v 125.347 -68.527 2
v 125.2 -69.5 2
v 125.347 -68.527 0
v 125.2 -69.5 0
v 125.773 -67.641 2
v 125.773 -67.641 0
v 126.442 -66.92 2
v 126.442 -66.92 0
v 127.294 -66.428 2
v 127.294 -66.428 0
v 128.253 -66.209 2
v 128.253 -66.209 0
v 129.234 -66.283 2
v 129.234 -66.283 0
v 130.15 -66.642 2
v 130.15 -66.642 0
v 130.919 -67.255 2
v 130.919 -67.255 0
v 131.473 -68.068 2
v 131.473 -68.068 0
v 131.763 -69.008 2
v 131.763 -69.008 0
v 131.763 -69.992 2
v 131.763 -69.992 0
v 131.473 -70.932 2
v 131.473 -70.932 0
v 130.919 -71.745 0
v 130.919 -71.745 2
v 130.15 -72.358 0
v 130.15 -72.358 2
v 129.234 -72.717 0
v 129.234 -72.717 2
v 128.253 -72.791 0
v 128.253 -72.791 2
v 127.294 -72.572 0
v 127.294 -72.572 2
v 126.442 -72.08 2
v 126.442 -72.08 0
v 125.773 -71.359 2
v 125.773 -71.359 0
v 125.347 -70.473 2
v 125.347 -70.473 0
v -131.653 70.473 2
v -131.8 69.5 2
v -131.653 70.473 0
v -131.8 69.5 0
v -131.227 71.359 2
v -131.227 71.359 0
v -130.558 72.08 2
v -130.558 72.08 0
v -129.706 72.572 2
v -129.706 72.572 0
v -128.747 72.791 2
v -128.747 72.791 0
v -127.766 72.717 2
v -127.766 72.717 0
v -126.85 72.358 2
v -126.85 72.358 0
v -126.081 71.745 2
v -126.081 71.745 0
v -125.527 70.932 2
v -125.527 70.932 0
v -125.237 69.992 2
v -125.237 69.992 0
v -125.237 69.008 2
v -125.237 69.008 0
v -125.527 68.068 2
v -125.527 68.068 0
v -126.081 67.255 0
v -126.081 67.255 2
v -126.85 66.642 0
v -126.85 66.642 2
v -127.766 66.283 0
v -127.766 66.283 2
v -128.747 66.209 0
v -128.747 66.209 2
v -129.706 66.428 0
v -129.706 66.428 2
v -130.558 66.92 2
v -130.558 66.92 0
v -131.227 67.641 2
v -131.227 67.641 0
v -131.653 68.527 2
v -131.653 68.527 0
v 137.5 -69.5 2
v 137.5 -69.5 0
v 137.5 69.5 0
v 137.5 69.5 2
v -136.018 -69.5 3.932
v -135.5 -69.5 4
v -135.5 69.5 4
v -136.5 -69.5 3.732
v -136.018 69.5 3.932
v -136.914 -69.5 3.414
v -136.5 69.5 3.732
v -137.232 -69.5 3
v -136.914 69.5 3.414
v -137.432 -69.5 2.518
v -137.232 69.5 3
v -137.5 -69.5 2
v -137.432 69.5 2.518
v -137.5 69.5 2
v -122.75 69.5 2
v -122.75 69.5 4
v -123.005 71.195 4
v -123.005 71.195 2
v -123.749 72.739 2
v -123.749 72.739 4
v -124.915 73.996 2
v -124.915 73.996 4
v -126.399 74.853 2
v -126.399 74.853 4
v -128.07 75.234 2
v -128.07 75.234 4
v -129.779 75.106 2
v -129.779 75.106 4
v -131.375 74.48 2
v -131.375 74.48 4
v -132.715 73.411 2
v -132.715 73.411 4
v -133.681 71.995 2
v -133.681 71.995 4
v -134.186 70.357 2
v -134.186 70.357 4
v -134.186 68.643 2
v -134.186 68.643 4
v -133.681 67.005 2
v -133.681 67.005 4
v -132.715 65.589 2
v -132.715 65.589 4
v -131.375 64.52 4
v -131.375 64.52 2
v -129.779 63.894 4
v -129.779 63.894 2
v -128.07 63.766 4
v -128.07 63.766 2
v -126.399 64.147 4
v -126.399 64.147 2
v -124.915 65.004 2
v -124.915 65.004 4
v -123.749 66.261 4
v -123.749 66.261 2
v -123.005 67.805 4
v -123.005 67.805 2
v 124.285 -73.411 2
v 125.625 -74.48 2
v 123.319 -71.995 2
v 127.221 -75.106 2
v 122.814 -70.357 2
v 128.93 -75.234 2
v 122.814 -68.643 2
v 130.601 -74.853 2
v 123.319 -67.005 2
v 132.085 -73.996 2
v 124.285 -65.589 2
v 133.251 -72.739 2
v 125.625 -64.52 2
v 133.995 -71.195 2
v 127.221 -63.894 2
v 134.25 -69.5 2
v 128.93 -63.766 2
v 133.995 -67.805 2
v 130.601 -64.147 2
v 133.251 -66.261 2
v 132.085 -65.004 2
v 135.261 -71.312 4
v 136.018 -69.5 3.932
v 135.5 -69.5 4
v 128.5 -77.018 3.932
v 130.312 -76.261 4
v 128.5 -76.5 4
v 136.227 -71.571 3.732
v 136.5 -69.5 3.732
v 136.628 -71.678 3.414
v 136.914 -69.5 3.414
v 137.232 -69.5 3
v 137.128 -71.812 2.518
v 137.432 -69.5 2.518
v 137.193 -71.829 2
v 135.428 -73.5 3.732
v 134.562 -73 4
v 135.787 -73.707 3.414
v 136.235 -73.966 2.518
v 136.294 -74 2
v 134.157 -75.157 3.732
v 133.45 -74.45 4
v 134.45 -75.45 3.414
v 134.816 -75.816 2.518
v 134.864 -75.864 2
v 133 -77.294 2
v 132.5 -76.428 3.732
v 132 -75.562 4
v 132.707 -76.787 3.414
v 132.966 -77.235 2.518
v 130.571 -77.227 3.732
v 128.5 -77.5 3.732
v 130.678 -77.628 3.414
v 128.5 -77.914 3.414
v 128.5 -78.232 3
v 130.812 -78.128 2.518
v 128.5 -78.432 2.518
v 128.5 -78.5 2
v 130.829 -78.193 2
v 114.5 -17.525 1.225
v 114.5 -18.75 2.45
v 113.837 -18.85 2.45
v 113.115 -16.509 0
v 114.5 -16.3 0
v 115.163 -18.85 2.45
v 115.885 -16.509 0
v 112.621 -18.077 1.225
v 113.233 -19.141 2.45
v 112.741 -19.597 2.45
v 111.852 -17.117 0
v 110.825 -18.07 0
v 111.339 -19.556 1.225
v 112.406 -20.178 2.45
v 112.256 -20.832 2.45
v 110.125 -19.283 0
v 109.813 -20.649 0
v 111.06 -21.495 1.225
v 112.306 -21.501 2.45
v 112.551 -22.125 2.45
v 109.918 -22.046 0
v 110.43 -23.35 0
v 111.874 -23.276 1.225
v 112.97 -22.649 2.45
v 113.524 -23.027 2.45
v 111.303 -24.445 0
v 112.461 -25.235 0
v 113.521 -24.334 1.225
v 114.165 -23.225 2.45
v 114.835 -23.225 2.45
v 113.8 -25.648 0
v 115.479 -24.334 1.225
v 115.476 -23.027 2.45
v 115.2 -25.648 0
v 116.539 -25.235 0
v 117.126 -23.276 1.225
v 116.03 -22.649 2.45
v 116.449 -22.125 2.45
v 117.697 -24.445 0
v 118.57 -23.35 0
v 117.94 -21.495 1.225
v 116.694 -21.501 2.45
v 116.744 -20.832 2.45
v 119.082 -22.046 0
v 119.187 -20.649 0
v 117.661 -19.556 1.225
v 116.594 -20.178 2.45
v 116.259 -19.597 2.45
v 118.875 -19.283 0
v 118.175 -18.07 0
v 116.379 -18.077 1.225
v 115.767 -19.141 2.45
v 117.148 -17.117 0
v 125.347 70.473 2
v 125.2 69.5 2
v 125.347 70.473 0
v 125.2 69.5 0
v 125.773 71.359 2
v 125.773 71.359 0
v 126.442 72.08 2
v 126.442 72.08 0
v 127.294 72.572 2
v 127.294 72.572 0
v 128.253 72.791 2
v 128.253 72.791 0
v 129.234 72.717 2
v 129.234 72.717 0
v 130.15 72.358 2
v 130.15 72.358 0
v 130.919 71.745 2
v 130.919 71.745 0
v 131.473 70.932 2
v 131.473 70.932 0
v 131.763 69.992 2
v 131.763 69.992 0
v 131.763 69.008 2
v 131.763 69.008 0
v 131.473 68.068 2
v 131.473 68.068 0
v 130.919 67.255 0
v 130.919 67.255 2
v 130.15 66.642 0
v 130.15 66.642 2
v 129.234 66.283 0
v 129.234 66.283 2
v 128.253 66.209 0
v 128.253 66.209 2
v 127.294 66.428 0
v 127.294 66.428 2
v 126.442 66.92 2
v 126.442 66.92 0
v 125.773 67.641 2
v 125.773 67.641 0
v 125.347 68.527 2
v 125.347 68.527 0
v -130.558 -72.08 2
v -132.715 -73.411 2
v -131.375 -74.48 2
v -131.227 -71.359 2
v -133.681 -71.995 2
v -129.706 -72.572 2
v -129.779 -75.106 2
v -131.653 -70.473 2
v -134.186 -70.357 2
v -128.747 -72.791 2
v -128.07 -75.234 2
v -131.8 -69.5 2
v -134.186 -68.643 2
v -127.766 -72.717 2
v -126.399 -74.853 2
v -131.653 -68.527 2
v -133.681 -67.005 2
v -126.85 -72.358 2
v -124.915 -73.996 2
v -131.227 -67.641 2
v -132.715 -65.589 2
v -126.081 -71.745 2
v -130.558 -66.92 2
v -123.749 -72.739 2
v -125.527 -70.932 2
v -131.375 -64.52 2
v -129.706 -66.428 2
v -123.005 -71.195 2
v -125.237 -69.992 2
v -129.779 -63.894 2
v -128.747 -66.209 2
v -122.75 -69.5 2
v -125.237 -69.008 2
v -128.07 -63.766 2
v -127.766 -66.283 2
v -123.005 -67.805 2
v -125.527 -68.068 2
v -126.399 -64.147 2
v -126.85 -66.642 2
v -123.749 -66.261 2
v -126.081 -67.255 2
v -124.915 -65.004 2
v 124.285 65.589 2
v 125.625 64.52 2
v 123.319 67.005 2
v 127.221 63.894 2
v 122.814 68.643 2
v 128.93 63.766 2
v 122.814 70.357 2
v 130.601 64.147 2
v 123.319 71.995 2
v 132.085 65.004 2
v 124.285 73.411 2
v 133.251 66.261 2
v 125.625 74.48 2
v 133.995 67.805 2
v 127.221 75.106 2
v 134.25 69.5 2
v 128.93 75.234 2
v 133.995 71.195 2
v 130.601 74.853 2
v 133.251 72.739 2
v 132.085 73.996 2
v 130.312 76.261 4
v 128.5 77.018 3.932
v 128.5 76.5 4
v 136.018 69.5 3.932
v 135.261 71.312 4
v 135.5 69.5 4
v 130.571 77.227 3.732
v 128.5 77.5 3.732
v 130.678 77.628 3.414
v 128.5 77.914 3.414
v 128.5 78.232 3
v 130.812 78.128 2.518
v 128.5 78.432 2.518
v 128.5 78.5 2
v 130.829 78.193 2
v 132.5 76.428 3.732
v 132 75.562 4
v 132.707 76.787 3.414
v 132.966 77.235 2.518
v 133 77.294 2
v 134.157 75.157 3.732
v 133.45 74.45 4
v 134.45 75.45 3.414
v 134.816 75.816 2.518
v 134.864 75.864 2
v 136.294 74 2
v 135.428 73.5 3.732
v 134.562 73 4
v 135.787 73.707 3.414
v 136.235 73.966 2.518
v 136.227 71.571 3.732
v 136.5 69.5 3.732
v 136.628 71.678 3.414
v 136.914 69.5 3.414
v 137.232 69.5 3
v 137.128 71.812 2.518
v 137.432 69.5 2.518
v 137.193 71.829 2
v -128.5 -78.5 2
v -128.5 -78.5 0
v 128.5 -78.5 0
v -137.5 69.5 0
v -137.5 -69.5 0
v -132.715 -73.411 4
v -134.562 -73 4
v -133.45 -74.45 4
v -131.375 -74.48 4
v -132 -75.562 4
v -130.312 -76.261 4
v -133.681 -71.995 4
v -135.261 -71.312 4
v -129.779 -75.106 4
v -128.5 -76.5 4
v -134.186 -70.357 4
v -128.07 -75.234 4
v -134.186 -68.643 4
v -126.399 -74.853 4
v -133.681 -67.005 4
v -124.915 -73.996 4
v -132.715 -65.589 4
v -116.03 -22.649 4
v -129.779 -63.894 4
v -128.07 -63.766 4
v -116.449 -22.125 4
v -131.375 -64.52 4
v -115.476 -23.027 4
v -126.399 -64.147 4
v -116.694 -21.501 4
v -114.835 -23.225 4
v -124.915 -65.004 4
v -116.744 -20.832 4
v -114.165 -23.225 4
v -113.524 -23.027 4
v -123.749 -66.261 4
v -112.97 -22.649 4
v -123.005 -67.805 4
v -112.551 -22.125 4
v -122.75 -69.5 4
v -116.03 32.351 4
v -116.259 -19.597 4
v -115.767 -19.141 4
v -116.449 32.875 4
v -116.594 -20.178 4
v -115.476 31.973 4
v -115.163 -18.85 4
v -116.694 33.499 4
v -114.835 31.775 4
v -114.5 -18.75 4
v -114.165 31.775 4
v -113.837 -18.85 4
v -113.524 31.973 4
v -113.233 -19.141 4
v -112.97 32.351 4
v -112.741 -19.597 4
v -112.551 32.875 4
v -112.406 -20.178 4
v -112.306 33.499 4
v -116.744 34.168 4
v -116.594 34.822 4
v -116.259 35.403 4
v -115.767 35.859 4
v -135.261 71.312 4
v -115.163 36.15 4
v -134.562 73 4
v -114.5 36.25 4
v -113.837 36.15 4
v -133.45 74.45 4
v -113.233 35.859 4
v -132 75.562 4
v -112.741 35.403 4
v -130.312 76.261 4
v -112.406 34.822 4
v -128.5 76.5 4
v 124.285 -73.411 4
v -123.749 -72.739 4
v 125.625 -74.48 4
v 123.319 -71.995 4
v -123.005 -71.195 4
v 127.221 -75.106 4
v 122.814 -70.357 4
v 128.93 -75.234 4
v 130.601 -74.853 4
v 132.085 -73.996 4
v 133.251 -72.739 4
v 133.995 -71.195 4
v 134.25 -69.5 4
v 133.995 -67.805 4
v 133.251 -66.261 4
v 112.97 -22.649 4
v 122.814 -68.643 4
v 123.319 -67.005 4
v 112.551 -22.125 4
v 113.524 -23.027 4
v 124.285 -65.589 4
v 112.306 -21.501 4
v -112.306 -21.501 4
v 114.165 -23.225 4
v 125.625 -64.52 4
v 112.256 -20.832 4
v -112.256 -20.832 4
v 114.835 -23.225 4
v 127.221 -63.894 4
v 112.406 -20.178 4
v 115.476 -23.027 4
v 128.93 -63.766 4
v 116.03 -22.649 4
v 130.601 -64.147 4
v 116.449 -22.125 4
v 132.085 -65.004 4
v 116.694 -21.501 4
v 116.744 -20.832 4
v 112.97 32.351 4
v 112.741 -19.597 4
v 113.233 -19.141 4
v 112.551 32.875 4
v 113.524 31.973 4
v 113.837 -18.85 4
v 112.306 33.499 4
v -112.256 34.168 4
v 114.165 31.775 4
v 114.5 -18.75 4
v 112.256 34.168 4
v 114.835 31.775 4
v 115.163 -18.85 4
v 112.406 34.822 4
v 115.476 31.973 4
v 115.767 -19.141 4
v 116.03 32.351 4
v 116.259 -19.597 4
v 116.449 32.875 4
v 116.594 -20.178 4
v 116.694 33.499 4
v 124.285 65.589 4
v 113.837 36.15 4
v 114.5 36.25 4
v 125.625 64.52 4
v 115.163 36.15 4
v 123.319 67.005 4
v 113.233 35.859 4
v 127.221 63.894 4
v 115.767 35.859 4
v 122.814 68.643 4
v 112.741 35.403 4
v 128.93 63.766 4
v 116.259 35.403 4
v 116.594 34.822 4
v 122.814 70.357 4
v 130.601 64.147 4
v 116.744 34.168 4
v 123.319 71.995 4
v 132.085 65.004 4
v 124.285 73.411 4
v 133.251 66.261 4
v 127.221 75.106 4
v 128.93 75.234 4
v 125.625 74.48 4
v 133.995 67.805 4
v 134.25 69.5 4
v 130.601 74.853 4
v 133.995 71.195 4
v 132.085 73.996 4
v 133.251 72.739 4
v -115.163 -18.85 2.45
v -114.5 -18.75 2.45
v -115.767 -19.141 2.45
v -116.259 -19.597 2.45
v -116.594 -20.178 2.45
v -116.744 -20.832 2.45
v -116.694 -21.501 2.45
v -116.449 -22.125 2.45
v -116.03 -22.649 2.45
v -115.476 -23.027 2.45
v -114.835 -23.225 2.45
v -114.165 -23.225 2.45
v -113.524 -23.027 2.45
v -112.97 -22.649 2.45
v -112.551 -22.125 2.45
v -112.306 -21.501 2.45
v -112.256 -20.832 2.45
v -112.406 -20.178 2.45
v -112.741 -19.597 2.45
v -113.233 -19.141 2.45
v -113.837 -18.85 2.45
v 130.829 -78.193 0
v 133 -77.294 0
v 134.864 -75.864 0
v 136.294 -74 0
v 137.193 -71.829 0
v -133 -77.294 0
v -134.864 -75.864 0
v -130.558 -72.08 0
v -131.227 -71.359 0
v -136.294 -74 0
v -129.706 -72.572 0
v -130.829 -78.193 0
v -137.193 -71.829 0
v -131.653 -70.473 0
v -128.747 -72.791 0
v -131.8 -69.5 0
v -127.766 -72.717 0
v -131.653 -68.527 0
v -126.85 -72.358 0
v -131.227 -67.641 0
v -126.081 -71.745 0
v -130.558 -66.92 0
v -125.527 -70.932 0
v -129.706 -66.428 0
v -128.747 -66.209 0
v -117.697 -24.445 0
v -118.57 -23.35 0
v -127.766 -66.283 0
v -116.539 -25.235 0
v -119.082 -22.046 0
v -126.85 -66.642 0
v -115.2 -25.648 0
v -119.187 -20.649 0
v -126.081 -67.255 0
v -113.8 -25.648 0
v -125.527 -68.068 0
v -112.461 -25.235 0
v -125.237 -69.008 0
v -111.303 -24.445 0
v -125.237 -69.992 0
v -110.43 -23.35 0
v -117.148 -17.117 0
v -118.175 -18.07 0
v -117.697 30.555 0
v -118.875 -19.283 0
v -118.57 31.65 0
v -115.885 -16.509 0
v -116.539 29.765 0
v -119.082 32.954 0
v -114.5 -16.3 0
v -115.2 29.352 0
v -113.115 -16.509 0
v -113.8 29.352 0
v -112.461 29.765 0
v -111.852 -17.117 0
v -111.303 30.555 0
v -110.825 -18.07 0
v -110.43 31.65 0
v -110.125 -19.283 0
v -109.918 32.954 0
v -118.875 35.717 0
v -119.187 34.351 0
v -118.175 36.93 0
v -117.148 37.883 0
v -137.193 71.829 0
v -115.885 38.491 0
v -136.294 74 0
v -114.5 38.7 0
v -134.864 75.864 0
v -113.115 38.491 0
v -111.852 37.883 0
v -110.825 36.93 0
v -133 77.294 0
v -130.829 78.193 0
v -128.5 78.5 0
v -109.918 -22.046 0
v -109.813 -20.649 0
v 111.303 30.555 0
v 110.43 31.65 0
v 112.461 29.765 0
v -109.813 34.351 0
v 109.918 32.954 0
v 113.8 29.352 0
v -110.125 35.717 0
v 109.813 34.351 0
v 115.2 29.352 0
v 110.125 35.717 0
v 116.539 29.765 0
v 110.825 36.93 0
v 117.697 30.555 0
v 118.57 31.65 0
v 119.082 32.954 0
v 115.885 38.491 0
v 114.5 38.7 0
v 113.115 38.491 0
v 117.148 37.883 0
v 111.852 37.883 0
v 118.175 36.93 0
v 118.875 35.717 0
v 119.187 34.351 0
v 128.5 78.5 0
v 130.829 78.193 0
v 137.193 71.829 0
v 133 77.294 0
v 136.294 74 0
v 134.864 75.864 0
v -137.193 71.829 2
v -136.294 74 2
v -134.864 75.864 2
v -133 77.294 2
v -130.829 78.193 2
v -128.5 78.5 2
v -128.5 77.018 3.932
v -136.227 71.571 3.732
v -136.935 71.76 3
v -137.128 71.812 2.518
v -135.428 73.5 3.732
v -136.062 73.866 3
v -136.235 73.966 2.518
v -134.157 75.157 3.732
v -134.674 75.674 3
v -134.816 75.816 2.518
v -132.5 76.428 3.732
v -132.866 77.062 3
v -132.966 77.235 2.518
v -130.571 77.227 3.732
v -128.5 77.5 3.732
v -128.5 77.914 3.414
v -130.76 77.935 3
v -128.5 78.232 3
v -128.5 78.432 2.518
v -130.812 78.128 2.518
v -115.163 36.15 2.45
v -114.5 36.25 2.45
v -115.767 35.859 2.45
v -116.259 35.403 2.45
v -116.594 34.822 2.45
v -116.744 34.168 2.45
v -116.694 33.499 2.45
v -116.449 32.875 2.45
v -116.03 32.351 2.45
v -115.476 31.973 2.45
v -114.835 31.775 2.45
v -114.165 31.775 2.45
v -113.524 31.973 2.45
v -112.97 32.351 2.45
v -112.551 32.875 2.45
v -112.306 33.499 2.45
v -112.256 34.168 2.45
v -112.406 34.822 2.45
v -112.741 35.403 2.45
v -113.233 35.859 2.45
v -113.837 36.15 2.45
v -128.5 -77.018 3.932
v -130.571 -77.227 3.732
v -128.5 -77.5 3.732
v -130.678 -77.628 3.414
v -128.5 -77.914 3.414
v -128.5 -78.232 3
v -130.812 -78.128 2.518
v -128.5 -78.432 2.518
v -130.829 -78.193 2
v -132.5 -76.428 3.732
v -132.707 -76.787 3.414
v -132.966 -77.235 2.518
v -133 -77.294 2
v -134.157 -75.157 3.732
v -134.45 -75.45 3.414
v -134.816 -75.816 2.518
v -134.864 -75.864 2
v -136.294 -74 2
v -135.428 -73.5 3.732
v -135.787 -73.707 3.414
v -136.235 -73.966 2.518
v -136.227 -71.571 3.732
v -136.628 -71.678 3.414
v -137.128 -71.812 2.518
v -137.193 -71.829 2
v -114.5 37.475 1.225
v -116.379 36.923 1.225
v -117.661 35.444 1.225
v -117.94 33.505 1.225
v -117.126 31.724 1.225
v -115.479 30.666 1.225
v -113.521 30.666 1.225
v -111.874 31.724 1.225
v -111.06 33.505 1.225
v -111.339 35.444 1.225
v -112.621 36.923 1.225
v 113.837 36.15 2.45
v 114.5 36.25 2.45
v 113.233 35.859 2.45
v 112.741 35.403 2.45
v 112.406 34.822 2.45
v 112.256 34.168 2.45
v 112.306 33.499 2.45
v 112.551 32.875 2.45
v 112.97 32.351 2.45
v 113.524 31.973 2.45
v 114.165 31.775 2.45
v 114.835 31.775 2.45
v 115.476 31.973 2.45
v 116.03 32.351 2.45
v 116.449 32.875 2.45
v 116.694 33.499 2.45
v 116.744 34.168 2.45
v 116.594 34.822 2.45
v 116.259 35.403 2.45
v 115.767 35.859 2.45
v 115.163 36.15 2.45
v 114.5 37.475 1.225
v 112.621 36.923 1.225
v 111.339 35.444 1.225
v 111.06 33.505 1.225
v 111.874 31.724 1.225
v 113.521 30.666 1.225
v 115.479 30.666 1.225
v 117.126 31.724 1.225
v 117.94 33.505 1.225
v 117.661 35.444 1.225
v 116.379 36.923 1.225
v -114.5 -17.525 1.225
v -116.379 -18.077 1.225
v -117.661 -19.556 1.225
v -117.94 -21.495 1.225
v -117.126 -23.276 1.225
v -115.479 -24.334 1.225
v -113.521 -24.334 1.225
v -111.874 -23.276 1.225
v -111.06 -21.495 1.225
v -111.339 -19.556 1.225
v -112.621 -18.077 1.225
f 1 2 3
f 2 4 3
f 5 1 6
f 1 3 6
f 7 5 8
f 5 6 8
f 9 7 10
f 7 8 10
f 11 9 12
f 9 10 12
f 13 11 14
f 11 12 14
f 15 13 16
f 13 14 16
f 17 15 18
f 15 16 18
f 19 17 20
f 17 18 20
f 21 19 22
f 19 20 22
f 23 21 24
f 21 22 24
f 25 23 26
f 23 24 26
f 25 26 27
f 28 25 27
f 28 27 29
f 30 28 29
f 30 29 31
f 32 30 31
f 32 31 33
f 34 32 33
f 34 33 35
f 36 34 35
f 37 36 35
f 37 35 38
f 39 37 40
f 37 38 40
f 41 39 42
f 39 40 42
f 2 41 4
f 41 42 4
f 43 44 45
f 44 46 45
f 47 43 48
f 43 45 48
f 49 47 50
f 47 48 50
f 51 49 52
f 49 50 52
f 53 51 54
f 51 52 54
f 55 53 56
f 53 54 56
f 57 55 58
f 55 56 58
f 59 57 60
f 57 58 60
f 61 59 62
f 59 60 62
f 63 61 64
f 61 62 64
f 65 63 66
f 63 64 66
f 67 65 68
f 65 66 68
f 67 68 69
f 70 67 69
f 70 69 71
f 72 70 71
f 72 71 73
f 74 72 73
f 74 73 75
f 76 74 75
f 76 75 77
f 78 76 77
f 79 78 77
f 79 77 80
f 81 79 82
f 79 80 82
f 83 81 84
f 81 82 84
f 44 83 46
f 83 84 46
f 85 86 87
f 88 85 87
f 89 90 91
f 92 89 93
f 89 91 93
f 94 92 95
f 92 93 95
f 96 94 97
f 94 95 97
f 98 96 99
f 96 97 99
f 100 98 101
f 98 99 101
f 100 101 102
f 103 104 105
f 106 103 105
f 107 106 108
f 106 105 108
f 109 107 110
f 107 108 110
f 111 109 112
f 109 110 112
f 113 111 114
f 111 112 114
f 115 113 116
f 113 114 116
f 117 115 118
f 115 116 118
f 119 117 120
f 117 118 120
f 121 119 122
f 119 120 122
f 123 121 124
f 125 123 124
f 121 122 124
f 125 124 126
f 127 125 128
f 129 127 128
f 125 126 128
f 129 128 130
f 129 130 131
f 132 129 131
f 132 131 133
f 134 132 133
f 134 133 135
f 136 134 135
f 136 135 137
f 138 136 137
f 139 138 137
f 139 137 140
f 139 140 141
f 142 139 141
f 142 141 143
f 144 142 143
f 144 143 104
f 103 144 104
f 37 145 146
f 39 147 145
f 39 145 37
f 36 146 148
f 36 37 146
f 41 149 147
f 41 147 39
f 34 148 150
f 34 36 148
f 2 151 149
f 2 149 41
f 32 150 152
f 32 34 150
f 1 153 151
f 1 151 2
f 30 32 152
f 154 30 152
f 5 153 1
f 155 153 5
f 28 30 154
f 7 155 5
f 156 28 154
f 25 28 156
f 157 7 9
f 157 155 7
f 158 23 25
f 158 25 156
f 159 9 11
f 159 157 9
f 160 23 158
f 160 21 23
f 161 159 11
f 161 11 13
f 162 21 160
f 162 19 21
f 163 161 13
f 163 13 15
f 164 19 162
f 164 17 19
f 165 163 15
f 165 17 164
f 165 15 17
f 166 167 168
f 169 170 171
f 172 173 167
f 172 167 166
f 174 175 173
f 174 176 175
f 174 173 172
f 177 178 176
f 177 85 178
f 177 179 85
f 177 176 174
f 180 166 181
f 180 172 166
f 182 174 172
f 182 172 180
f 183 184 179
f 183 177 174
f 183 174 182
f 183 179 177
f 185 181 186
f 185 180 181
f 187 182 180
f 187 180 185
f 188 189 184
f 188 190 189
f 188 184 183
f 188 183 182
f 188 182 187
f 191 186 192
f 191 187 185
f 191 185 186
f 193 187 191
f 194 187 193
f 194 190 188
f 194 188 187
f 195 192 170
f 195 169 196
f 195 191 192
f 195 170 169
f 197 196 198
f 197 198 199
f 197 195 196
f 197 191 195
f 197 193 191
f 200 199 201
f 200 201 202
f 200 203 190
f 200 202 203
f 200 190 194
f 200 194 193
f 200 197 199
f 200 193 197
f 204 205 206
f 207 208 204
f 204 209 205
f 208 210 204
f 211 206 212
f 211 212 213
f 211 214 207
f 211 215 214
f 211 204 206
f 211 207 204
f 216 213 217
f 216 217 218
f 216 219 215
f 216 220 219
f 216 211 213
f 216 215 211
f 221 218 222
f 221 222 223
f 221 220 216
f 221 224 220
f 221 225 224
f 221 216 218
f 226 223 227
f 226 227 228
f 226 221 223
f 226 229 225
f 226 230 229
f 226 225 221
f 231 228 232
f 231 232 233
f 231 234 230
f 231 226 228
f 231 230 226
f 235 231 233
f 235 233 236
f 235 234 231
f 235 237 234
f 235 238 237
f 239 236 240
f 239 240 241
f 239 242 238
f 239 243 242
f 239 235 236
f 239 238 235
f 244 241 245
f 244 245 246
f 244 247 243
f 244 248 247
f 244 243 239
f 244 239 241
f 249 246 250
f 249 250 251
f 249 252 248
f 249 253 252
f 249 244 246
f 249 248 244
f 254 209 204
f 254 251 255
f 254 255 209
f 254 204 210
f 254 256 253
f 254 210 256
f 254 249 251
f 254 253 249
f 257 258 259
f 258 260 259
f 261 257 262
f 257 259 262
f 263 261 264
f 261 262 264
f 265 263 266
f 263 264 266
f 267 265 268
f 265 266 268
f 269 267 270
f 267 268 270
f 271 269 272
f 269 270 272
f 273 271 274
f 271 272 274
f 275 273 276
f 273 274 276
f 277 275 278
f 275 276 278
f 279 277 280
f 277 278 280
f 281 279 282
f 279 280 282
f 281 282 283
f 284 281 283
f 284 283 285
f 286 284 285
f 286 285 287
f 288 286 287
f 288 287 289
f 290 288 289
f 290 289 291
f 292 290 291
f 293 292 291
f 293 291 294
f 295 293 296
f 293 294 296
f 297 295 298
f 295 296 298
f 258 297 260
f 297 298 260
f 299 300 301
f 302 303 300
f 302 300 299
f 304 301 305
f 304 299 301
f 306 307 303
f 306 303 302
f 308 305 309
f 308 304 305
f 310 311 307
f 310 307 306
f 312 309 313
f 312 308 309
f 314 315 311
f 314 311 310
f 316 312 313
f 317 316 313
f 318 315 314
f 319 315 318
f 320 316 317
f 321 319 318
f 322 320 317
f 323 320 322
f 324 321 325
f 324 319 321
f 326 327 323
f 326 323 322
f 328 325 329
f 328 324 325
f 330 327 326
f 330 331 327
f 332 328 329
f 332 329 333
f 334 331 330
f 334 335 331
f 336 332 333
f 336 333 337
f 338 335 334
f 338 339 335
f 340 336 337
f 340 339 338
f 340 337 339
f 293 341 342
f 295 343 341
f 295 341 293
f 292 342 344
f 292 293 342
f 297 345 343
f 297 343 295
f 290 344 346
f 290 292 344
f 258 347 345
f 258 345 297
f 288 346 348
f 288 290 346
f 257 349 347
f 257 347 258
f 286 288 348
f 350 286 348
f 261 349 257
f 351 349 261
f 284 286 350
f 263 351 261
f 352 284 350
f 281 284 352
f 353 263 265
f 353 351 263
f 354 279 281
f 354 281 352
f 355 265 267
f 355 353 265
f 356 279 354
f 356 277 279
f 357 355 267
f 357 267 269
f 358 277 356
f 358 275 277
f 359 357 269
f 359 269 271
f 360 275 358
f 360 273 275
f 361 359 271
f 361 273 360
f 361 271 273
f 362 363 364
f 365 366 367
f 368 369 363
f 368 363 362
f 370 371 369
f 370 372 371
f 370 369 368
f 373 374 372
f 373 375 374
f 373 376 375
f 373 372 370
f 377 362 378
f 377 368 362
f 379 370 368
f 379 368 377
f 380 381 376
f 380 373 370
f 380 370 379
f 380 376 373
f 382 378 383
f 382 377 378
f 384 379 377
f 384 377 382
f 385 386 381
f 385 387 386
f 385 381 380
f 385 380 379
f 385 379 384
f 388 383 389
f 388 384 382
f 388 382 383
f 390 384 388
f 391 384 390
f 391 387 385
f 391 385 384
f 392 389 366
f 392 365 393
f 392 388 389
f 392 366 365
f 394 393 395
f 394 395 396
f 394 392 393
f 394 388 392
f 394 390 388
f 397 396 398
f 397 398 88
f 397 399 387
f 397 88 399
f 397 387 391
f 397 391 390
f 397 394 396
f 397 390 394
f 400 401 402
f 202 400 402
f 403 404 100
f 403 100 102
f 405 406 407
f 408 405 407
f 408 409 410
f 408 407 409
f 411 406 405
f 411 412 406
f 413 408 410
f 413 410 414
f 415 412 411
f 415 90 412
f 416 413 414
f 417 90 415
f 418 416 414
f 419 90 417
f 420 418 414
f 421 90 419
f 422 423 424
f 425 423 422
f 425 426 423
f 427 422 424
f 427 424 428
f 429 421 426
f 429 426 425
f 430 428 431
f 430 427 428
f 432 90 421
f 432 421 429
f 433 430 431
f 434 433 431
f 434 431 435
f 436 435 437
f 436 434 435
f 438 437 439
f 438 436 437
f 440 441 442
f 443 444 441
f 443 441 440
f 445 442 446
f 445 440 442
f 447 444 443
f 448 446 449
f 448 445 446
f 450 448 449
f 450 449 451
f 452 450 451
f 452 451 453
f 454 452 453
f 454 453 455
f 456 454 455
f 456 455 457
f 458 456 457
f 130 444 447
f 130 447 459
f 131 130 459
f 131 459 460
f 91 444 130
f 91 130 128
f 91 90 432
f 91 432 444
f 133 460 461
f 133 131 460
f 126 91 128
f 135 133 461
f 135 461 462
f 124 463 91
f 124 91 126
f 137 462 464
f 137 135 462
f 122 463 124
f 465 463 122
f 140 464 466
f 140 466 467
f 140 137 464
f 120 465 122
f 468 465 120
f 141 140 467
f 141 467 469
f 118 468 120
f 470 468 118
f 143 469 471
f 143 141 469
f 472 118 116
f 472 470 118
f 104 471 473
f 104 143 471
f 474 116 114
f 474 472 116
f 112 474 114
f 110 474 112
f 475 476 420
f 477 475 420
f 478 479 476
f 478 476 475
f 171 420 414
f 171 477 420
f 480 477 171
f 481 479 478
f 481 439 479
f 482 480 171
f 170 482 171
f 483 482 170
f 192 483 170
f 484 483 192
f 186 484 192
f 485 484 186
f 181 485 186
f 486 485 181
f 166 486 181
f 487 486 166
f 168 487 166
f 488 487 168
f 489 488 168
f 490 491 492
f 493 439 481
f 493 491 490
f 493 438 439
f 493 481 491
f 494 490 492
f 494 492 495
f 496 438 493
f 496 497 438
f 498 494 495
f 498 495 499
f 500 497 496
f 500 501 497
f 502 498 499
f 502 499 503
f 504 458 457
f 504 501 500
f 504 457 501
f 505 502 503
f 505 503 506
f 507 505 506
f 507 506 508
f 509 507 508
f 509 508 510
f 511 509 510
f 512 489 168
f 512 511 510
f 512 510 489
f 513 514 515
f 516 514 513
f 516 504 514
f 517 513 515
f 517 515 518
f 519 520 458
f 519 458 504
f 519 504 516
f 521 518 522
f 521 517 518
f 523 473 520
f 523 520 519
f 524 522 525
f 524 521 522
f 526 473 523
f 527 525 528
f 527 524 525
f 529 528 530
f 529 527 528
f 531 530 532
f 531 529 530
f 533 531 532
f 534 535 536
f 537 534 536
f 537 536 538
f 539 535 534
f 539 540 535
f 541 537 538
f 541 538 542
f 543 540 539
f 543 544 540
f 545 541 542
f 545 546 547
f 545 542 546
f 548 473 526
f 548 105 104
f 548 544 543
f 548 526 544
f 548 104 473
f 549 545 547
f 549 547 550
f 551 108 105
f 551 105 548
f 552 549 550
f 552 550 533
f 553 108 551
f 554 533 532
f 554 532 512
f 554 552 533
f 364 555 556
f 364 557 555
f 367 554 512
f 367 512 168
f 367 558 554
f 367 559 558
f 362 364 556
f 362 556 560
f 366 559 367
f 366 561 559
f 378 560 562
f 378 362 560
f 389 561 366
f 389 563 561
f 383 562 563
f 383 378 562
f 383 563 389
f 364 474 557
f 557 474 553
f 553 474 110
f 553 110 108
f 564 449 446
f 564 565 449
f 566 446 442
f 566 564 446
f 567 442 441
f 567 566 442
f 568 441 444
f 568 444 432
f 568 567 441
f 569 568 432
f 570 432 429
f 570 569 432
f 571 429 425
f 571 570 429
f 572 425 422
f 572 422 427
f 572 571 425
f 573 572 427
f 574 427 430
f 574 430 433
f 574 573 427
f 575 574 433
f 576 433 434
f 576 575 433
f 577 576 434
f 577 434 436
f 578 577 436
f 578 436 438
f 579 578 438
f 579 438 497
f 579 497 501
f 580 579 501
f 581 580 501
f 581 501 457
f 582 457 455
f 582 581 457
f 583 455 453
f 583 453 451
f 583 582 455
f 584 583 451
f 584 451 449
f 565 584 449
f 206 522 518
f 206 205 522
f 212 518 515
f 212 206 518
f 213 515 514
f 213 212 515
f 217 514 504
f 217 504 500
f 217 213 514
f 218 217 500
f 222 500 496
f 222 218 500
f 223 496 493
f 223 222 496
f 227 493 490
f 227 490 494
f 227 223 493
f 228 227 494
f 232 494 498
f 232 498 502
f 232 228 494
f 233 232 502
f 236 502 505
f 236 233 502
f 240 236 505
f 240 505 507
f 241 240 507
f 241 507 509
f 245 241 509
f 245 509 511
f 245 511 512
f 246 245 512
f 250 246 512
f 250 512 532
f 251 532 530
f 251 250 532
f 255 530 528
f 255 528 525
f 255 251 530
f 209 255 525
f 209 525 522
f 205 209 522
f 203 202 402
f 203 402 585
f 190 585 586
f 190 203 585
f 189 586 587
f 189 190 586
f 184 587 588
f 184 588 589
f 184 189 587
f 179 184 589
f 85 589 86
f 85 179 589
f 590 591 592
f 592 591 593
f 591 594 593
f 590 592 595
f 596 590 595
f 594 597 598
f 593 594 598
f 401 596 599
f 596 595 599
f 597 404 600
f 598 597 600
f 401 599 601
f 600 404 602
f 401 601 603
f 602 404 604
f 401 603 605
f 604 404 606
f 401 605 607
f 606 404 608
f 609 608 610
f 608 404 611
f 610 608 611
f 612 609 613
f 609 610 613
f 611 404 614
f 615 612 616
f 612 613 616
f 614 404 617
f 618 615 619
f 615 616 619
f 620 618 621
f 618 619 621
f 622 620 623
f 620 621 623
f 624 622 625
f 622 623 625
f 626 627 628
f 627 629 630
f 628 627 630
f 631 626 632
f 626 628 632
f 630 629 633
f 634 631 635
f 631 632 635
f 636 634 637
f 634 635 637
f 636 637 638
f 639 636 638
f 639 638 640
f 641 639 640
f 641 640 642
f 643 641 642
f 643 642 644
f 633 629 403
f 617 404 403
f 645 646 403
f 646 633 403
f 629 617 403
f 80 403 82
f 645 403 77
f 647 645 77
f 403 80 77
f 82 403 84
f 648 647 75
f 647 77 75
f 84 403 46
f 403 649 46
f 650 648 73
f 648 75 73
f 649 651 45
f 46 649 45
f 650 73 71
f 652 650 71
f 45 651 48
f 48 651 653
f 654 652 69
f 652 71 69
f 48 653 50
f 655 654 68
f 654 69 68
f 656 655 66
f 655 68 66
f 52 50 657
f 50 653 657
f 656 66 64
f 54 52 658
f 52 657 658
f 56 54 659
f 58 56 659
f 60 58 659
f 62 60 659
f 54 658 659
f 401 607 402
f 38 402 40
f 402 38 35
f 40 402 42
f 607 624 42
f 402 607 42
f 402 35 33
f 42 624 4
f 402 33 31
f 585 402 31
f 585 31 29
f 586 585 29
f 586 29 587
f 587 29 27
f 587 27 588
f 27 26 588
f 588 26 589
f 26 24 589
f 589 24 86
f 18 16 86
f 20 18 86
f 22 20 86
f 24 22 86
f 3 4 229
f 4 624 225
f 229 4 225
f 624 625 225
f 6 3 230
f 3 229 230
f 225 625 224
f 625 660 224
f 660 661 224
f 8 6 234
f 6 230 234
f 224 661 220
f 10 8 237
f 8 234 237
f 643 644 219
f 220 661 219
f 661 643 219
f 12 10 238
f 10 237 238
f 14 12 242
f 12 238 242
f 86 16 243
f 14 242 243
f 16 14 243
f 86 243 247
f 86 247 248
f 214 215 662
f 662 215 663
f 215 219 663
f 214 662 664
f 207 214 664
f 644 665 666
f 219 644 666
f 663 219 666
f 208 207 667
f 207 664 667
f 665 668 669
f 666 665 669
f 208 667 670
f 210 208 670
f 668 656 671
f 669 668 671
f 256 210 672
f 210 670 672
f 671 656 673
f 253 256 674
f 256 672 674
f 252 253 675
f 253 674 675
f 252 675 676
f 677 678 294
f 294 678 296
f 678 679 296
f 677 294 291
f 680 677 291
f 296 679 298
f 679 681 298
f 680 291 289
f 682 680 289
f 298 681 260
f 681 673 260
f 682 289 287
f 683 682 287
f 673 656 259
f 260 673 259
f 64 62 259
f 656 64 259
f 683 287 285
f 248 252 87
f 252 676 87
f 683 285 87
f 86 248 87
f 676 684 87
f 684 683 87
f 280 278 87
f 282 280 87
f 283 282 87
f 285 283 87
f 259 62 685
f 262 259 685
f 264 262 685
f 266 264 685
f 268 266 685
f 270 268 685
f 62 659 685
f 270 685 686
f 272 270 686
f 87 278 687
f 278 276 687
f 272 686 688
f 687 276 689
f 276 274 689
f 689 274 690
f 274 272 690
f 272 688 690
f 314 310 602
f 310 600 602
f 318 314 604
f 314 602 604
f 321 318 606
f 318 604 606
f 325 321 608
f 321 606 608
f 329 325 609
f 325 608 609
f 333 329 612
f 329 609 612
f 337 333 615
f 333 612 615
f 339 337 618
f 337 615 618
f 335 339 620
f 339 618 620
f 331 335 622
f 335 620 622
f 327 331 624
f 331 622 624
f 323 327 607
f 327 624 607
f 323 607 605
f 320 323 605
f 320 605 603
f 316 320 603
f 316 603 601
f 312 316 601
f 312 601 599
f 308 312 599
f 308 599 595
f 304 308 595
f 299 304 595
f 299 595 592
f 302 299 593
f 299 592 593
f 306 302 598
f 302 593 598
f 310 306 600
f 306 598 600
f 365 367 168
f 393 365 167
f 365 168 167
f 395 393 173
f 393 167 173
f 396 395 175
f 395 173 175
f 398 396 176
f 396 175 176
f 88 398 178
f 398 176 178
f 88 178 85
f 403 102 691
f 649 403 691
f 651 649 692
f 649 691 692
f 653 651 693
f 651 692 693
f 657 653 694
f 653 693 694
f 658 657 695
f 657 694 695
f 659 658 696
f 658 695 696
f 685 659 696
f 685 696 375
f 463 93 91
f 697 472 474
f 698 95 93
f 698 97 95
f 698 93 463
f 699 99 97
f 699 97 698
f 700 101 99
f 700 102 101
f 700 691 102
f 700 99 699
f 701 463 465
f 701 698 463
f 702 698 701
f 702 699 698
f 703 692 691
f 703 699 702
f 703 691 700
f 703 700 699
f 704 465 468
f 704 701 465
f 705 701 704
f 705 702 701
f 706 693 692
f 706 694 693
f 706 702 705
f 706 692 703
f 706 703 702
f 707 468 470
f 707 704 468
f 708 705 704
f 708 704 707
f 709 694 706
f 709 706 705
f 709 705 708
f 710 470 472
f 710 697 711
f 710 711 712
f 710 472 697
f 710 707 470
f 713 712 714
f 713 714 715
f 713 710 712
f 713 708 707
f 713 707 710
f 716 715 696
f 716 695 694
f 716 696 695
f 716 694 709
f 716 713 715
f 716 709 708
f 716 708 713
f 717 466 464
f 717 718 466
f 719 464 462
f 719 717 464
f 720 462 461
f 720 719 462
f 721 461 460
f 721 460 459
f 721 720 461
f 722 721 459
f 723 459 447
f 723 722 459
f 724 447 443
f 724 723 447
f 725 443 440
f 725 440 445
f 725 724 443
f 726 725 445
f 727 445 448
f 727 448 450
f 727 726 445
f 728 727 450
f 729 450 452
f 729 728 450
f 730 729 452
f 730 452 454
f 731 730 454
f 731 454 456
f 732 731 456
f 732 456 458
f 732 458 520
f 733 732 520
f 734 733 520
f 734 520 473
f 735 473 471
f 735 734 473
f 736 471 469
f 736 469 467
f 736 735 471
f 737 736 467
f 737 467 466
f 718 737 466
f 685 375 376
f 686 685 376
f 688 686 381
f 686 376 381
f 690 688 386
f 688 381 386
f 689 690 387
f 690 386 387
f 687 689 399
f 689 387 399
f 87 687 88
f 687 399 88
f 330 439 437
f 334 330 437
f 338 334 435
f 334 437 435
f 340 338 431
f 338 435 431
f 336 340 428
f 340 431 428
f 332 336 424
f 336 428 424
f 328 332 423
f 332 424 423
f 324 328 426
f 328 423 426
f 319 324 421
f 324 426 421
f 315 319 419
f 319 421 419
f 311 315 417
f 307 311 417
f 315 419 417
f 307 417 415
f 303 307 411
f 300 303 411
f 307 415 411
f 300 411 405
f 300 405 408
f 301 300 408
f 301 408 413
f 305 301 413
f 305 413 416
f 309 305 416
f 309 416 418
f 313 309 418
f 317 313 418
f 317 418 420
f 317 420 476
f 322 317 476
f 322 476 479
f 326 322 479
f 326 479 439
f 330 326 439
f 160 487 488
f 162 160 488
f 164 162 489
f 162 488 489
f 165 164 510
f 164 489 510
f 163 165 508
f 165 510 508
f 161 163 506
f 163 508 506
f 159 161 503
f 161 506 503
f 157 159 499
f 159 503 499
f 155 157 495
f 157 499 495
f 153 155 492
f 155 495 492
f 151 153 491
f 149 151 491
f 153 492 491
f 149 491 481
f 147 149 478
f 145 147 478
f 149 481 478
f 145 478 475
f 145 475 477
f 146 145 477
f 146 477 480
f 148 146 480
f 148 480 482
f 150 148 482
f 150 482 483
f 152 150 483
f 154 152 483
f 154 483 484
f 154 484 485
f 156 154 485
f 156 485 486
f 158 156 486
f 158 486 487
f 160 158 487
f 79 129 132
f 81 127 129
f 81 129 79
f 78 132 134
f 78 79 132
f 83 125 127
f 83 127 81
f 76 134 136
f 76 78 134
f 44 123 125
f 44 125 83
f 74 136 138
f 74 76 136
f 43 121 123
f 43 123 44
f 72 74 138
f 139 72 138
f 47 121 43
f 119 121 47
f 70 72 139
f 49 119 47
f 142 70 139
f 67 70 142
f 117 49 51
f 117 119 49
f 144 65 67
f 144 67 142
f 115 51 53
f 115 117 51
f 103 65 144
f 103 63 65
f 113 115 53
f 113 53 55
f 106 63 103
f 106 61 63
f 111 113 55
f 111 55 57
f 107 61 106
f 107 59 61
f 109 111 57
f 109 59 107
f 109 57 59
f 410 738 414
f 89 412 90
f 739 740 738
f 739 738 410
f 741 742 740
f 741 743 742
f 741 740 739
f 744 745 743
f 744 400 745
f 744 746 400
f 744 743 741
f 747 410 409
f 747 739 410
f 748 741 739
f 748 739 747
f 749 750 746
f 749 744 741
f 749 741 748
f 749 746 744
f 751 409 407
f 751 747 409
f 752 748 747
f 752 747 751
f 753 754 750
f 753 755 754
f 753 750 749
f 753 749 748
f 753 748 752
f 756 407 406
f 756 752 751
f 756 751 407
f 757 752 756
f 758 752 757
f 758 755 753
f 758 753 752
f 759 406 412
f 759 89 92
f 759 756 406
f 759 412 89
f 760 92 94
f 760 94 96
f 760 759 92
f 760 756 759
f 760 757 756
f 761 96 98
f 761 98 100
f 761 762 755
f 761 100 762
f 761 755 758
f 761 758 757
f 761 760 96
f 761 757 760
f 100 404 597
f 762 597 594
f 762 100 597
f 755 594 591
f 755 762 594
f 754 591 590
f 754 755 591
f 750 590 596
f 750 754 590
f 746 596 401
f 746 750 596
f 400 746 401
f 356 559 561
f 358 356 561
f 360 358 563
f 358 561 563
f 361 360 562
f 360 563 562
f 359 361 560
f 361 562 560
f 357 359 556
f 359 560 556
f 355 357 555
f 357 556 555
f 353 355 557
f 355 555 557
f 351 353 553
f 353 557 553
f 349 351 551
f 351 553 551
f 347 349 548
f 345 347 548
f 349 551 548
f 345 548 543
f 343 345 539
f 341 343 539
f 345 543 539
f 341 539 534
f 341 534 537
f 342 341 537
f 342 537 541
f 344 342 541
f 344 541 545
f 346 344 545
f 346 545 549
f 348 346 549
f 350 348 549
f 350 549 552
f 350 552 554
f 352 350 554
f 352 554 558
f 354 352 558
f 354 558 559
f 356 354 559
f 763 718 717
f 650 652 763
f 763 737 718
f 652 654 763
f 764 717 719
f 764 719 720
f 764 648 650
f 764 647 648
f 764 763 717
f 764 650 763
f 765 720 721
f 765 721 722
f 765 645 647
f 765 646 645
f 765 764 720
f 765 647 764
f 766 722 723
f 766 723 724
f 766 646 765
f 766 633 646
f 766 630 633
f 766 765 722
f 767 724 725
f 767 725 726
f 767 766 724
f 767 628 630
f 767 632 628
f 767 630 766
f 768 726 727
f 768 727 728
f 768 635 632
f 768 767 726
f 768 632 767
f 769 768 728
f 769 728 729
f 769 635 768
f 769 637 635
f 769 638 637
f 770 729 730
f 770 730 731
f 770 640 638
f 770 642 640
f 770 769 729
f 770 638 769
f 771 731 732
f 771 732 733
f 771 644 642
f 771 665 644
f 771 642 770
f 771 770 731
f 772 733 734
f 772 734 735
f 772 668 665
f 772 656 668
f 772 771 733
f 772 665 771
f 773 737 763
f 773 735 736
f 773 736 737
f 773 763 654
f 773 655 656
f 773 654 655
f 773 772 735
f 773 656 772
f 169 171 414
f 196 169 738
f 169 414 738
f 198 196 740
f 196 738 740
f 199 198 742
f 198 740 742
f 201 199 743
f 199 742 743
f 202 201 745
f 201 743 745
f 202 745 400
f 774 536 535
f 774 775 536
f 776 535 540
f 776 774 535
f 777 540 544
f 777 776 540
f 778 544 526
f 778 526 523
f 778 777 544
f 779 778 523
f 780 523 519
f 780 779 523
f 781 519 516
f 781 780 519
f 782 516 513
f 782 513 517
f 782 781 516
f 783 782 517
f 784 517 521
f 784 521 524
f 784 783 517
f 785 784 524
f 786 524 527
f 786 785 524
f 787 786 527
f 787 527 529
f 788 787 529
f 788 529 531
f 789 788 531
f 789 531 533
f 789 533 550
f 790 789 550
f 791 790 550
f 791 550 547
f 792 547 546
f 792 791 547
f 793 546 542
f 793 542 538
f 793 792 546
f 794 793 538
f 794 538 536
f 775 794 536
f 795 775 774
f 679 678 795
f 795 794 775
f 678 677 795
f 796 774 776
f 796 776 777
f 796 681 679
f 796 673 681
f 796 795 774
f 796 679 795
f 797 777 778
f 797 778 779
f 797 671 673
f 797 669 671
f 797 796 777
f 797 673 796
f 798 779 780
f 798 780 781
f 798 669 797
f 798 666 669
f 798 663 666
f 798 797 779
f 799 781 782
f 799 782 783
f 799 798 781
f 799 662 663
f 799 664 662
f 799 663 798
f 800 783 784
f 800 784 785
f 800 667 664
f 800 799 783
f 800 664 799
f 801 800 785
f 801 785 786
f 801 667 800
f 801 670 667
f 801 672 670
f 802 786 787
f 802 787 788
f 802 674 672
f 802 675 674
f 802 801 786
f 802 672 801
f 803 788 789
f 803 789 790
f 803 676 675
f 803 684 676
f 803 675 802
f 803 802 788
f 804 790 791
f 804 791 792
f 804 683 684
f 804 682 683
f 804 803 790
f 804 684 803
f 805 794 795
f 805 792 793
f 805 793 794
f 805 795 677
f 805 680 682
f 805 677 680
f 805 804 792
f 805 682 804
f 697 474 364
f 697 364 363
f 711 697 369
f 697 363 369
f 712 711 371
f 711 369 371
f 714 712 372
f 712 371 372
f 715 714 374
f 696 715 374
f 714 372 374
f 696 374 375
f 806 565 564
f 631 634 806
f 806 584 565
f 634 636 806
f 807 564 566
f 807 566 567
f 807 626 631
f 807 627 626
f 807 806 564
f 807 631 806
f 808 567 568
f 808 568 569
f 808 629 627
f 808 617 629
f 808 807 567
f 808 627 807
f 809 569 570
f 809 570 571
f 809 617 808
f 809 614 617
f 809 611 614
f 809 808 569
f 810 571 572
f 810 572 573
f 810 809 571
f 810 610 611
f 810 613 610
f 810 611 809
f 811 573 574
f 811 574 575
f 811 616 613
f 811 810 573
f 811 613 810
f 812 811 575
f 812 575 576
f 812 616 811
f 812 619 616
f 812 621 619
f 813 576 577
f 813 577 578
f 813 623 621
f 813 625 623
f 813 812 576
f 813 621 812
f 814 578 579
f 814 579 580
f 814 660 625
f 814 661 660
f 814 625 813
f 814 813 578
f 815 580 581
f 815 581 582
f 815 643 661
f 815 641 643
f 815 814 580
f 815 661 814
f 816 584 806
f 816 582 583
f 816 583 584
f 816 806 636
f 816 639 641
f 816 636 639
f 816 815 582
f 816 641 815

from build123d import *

# Parameters (mm, degrees)
ESQUISSE4_W                                      = 275
ESQUISSE4_H                                      = 157
BOSS_EXTRU_2_DEPTH                               = 4
FRAISAGE_POUR_VIS_T_TE_FRAIS_E_M42_AT_COUNT      = 2
FRAISAGE_POUR_VIS_T_TE_FRAIS_E_M42_AT_PITCH      = 235.512207752
FRAISAGE_POUR_VIS_T_TE_FRAIS_E_M42_2_COUNT       = 2
FRAISAGE_POUR_VIS_T_TE_FRAIS_E_M42_2_PITCH       = 229
FRAISAGE_POUR_VIS_T_TE_FRAIS_E_M42_3_COUNT       = 2
FRAISAGE_POUR_VIS_T_TE_FRAIS_E_M42_3_PITCH       = 55
CHAMBRAGE_POUR_VIS_T_TE_RONDE_6_PANS_D           = 6.6
CHAMBRAGE_POUR_VIS_T_TE_RONDE_6_PANS_CBORE_D     = 11.5
CHAMBRAGE_POUR_VIS_T_TE_RONDE_6_PANS_CBORE_DEPTH = 2
CONG_1_R                                         = 9
CONG_2_R                                         = 2


with BuildPart() as part:
    # Esquisse4 → Boss.-Extru.2 (new body)
    with BuildSketch(Plane.XY):
        Rectangle(ESQUISSE4_W, ESQUISSE4_H)
    extrude(amount=BOSS_EXTRU_2_DEPTH)

    # Esquisse6 → Fraisage pour vis à tête fraisée M42 (revolve, cut)
    with BuildSketch(Plane(origin=(-114.5, -21, 0), x_dir=(0, 1, 0), z_dir=(1, 0, 0))):
        Polygon((0, 0), (0, 4), (2.25, 4), (2.25, 2.45), (4.7, 0), align=None)
    fraisage_pour_vis_t_te_frais_e_m42 = revolve(axis=Axis((-114.5, -21, -6.35), (0, 0, 1)), mode=Mode.SUBTRACT)

    # Fraisage pour vis à tête fraisée M42 at: Fraisage pour vis à tête fraisée M42 ×2
    with Locations(*[Vector(0.972348747, 0.233533542, 0) * (i * FRAISAGE_POUR_VIS_T_TE_FRAIS_E_M42_AT_PITCH) for i in range(1, FRAISAGE_POUR_VIS_T_TE_FRAIS_E_M42_AT_COUNT)]):
        add(fraisage_pour_vis_t_te_frais_e_m42, mode=Mode.SUBTRACT)

    # Fraisage pour vis _ t_te frais_e M42 2: Fraisage pour vis à tête fraisée M42 ×2
    with Locations(*[(i * FRAISAGE_POUR_VIS_T_TE_FRAIS_E_M42_2_PITCH, 0, 0) for i in range(1, FRAISAGE_POUR_VIS_T_TE_FRAIS_E_M42_2_COUNT)]):
        add(fraisage_pour_vis_t_te_frais_e_m42, mode=Mode.SUBTRACT)

    # Fraisage pour vis _ t_te frais_e M42 3: Fraisage pour vis à tête fraisée M42 ×2
    with Locations(*[(0, i * FRAISAGE_POUR_VIS_T_TE_FRAIS_E_M42_3_PITCH, 0) for i in range(1, FRAISAGE_POUR_VIS_T_TE_FRAIS_E_M42_3_COUNT)]):
        add(fraisage_pour_vis_t_te_frais_e_m42, mode=Mode.SUBTRACT)

    # Chambrage pour Vis à tête ronde à 6 pans creux M61 (through all)
    with Locations(Plane.XY.offset(4)):
        with Locations((128.5, -69.5), (-128.5, -69.5), (-128.5, 69.5), (128.5, 69.5)):
            CounterBoreHole(CHAMBRAGE_POUR_VIS_T_TE_RONDE_6_PANS_D / 2, CHAMBRAGE_POUR_VIS_T_TE_RONDE_6_PANS_CBORE_D / 2, CHAMBRAGE_POUR_VIS_T_TE_RONDE_6_PANS_CBORE_DEPTH)

    # Congé1
    cong_1_edges = [part.edges().sort_by_distance(p)[0] for p in [
        (137.5, 78.5, 2),
        (137.5, -78.5, 2),
        (-137.5, -78.5, 2),
        (-137.5, 78.5, 2),
    ]]
    fillet(cong_1_edges, radius=CONG_1_R)

    # Congé2
    cong_2_edges = [part.edges().sort_by_distance(p)[0] for p in [
        (0, 78.5, 4),
        (137.5, 0, 4),
        (-137.5, 0, 4),
        (0, -78.5, 4),
        (-134.863961031, -75.863961031, 4),
        (-134.863961031, 75.863961031, 4),
        (134.863961031, -75.863961031, 4),
        (134.863961031, 75.863961031, 4),
    ]]
    fillet(cong_2_edges, radius=CONG_2_R)


solid = part.part
